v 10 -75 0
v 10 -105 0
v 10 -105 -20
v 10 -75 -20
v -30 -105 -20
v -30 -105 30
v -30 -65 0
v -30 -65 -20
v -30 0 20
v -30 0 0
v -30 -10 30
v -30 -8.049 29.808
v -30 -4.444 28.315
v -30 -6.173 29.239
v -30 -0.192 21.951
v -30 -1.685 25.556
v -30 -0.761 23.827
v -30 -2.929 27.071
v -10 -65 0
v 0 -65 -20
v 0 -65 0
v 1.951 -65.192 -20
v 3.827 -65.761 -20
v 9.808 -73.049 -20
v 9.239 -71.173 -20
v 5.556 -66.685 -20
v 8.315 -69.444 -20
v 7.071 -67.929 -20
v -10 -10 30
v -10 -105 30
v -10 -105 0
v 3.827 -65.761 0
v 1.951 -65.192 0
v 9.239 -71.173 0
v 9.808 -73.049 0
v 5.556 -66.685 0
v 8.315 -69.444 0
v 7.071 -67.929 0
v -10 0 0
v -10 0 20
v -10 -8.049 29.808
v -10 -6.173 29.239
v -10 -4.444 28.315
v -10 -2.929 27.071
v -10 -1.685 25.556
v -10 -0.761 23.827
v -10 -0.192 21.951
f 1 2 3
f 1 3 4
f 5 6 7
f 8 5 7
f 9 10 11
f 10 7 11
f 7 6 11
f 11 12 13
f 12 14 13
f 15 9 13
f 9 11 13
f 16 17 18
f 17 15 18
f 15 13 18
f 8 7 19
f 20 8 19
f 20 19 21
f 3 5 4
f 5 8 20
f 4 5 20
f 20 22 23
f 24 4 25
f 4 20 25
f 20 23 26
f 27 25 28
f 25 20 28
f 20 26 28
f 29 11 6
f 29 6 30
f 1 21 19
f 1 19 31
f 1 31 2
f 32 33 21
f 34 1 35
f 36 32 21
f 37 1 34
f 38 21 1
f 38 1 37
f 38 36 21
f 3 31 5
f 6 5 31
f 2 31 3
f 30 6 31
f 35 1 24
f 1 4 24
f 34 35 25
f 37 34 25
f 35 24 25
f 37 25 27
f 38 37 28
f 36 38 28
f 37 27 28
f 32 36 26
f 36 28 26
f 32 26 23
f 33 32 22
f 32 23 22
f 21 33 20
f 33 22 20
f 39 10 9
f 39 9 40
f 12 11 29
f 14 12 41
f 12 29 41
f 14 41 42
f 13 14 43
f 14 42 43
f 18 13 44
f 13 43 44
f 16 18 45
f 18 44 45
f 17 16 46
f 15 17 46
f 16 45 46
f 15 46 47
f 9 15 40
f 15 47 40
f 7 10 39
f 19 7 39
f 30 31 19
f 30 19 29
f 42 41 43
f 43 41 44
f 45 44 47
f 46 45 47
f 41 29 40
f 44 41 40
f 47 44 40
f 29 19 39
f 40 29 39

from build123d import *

# Parameters (mm, degrees)
SKETCH1_W           = 20
SKETCH1_H           = 105
BOSS_EXTRUDE1_DEPTH = 30
SKETCH2_W           = 40
SKETCH2_H           = 40
BOSS_EXTRUDE2_DEPTH = 20
FILLET1_R           = 10


with BuildPart() as part:
    # Sketch1 → Boss-Extrude1 (new body)
    with BuildSketch(Plane.XY):
        with Locations((-20, -52.5)):
            Rectangle(SKETCH1_W, SKETCH1_H)
    extrude(amount=BOSS_EXTRUDE1_DEPTH)

    # Sketch2 → Boss-Extrude2 (add)
    with BuildSketch(Plane.XY):
        with Locations((-10, -85)):
            Rectangle(SKETCH2_W, SKETCH2_H)
    extrude(amount=-BOSS_EXTRUDE2_DEPTH)

    # Fillet1
    fillet1_edges = [part.edges().sort_by_distance(p)[0] for p in [
        (10, -65, -10),
        (-20, 0, 30),
    ]]
    fillet(fillet1_edges, radius=FILLET1_R)


solid = part.part
